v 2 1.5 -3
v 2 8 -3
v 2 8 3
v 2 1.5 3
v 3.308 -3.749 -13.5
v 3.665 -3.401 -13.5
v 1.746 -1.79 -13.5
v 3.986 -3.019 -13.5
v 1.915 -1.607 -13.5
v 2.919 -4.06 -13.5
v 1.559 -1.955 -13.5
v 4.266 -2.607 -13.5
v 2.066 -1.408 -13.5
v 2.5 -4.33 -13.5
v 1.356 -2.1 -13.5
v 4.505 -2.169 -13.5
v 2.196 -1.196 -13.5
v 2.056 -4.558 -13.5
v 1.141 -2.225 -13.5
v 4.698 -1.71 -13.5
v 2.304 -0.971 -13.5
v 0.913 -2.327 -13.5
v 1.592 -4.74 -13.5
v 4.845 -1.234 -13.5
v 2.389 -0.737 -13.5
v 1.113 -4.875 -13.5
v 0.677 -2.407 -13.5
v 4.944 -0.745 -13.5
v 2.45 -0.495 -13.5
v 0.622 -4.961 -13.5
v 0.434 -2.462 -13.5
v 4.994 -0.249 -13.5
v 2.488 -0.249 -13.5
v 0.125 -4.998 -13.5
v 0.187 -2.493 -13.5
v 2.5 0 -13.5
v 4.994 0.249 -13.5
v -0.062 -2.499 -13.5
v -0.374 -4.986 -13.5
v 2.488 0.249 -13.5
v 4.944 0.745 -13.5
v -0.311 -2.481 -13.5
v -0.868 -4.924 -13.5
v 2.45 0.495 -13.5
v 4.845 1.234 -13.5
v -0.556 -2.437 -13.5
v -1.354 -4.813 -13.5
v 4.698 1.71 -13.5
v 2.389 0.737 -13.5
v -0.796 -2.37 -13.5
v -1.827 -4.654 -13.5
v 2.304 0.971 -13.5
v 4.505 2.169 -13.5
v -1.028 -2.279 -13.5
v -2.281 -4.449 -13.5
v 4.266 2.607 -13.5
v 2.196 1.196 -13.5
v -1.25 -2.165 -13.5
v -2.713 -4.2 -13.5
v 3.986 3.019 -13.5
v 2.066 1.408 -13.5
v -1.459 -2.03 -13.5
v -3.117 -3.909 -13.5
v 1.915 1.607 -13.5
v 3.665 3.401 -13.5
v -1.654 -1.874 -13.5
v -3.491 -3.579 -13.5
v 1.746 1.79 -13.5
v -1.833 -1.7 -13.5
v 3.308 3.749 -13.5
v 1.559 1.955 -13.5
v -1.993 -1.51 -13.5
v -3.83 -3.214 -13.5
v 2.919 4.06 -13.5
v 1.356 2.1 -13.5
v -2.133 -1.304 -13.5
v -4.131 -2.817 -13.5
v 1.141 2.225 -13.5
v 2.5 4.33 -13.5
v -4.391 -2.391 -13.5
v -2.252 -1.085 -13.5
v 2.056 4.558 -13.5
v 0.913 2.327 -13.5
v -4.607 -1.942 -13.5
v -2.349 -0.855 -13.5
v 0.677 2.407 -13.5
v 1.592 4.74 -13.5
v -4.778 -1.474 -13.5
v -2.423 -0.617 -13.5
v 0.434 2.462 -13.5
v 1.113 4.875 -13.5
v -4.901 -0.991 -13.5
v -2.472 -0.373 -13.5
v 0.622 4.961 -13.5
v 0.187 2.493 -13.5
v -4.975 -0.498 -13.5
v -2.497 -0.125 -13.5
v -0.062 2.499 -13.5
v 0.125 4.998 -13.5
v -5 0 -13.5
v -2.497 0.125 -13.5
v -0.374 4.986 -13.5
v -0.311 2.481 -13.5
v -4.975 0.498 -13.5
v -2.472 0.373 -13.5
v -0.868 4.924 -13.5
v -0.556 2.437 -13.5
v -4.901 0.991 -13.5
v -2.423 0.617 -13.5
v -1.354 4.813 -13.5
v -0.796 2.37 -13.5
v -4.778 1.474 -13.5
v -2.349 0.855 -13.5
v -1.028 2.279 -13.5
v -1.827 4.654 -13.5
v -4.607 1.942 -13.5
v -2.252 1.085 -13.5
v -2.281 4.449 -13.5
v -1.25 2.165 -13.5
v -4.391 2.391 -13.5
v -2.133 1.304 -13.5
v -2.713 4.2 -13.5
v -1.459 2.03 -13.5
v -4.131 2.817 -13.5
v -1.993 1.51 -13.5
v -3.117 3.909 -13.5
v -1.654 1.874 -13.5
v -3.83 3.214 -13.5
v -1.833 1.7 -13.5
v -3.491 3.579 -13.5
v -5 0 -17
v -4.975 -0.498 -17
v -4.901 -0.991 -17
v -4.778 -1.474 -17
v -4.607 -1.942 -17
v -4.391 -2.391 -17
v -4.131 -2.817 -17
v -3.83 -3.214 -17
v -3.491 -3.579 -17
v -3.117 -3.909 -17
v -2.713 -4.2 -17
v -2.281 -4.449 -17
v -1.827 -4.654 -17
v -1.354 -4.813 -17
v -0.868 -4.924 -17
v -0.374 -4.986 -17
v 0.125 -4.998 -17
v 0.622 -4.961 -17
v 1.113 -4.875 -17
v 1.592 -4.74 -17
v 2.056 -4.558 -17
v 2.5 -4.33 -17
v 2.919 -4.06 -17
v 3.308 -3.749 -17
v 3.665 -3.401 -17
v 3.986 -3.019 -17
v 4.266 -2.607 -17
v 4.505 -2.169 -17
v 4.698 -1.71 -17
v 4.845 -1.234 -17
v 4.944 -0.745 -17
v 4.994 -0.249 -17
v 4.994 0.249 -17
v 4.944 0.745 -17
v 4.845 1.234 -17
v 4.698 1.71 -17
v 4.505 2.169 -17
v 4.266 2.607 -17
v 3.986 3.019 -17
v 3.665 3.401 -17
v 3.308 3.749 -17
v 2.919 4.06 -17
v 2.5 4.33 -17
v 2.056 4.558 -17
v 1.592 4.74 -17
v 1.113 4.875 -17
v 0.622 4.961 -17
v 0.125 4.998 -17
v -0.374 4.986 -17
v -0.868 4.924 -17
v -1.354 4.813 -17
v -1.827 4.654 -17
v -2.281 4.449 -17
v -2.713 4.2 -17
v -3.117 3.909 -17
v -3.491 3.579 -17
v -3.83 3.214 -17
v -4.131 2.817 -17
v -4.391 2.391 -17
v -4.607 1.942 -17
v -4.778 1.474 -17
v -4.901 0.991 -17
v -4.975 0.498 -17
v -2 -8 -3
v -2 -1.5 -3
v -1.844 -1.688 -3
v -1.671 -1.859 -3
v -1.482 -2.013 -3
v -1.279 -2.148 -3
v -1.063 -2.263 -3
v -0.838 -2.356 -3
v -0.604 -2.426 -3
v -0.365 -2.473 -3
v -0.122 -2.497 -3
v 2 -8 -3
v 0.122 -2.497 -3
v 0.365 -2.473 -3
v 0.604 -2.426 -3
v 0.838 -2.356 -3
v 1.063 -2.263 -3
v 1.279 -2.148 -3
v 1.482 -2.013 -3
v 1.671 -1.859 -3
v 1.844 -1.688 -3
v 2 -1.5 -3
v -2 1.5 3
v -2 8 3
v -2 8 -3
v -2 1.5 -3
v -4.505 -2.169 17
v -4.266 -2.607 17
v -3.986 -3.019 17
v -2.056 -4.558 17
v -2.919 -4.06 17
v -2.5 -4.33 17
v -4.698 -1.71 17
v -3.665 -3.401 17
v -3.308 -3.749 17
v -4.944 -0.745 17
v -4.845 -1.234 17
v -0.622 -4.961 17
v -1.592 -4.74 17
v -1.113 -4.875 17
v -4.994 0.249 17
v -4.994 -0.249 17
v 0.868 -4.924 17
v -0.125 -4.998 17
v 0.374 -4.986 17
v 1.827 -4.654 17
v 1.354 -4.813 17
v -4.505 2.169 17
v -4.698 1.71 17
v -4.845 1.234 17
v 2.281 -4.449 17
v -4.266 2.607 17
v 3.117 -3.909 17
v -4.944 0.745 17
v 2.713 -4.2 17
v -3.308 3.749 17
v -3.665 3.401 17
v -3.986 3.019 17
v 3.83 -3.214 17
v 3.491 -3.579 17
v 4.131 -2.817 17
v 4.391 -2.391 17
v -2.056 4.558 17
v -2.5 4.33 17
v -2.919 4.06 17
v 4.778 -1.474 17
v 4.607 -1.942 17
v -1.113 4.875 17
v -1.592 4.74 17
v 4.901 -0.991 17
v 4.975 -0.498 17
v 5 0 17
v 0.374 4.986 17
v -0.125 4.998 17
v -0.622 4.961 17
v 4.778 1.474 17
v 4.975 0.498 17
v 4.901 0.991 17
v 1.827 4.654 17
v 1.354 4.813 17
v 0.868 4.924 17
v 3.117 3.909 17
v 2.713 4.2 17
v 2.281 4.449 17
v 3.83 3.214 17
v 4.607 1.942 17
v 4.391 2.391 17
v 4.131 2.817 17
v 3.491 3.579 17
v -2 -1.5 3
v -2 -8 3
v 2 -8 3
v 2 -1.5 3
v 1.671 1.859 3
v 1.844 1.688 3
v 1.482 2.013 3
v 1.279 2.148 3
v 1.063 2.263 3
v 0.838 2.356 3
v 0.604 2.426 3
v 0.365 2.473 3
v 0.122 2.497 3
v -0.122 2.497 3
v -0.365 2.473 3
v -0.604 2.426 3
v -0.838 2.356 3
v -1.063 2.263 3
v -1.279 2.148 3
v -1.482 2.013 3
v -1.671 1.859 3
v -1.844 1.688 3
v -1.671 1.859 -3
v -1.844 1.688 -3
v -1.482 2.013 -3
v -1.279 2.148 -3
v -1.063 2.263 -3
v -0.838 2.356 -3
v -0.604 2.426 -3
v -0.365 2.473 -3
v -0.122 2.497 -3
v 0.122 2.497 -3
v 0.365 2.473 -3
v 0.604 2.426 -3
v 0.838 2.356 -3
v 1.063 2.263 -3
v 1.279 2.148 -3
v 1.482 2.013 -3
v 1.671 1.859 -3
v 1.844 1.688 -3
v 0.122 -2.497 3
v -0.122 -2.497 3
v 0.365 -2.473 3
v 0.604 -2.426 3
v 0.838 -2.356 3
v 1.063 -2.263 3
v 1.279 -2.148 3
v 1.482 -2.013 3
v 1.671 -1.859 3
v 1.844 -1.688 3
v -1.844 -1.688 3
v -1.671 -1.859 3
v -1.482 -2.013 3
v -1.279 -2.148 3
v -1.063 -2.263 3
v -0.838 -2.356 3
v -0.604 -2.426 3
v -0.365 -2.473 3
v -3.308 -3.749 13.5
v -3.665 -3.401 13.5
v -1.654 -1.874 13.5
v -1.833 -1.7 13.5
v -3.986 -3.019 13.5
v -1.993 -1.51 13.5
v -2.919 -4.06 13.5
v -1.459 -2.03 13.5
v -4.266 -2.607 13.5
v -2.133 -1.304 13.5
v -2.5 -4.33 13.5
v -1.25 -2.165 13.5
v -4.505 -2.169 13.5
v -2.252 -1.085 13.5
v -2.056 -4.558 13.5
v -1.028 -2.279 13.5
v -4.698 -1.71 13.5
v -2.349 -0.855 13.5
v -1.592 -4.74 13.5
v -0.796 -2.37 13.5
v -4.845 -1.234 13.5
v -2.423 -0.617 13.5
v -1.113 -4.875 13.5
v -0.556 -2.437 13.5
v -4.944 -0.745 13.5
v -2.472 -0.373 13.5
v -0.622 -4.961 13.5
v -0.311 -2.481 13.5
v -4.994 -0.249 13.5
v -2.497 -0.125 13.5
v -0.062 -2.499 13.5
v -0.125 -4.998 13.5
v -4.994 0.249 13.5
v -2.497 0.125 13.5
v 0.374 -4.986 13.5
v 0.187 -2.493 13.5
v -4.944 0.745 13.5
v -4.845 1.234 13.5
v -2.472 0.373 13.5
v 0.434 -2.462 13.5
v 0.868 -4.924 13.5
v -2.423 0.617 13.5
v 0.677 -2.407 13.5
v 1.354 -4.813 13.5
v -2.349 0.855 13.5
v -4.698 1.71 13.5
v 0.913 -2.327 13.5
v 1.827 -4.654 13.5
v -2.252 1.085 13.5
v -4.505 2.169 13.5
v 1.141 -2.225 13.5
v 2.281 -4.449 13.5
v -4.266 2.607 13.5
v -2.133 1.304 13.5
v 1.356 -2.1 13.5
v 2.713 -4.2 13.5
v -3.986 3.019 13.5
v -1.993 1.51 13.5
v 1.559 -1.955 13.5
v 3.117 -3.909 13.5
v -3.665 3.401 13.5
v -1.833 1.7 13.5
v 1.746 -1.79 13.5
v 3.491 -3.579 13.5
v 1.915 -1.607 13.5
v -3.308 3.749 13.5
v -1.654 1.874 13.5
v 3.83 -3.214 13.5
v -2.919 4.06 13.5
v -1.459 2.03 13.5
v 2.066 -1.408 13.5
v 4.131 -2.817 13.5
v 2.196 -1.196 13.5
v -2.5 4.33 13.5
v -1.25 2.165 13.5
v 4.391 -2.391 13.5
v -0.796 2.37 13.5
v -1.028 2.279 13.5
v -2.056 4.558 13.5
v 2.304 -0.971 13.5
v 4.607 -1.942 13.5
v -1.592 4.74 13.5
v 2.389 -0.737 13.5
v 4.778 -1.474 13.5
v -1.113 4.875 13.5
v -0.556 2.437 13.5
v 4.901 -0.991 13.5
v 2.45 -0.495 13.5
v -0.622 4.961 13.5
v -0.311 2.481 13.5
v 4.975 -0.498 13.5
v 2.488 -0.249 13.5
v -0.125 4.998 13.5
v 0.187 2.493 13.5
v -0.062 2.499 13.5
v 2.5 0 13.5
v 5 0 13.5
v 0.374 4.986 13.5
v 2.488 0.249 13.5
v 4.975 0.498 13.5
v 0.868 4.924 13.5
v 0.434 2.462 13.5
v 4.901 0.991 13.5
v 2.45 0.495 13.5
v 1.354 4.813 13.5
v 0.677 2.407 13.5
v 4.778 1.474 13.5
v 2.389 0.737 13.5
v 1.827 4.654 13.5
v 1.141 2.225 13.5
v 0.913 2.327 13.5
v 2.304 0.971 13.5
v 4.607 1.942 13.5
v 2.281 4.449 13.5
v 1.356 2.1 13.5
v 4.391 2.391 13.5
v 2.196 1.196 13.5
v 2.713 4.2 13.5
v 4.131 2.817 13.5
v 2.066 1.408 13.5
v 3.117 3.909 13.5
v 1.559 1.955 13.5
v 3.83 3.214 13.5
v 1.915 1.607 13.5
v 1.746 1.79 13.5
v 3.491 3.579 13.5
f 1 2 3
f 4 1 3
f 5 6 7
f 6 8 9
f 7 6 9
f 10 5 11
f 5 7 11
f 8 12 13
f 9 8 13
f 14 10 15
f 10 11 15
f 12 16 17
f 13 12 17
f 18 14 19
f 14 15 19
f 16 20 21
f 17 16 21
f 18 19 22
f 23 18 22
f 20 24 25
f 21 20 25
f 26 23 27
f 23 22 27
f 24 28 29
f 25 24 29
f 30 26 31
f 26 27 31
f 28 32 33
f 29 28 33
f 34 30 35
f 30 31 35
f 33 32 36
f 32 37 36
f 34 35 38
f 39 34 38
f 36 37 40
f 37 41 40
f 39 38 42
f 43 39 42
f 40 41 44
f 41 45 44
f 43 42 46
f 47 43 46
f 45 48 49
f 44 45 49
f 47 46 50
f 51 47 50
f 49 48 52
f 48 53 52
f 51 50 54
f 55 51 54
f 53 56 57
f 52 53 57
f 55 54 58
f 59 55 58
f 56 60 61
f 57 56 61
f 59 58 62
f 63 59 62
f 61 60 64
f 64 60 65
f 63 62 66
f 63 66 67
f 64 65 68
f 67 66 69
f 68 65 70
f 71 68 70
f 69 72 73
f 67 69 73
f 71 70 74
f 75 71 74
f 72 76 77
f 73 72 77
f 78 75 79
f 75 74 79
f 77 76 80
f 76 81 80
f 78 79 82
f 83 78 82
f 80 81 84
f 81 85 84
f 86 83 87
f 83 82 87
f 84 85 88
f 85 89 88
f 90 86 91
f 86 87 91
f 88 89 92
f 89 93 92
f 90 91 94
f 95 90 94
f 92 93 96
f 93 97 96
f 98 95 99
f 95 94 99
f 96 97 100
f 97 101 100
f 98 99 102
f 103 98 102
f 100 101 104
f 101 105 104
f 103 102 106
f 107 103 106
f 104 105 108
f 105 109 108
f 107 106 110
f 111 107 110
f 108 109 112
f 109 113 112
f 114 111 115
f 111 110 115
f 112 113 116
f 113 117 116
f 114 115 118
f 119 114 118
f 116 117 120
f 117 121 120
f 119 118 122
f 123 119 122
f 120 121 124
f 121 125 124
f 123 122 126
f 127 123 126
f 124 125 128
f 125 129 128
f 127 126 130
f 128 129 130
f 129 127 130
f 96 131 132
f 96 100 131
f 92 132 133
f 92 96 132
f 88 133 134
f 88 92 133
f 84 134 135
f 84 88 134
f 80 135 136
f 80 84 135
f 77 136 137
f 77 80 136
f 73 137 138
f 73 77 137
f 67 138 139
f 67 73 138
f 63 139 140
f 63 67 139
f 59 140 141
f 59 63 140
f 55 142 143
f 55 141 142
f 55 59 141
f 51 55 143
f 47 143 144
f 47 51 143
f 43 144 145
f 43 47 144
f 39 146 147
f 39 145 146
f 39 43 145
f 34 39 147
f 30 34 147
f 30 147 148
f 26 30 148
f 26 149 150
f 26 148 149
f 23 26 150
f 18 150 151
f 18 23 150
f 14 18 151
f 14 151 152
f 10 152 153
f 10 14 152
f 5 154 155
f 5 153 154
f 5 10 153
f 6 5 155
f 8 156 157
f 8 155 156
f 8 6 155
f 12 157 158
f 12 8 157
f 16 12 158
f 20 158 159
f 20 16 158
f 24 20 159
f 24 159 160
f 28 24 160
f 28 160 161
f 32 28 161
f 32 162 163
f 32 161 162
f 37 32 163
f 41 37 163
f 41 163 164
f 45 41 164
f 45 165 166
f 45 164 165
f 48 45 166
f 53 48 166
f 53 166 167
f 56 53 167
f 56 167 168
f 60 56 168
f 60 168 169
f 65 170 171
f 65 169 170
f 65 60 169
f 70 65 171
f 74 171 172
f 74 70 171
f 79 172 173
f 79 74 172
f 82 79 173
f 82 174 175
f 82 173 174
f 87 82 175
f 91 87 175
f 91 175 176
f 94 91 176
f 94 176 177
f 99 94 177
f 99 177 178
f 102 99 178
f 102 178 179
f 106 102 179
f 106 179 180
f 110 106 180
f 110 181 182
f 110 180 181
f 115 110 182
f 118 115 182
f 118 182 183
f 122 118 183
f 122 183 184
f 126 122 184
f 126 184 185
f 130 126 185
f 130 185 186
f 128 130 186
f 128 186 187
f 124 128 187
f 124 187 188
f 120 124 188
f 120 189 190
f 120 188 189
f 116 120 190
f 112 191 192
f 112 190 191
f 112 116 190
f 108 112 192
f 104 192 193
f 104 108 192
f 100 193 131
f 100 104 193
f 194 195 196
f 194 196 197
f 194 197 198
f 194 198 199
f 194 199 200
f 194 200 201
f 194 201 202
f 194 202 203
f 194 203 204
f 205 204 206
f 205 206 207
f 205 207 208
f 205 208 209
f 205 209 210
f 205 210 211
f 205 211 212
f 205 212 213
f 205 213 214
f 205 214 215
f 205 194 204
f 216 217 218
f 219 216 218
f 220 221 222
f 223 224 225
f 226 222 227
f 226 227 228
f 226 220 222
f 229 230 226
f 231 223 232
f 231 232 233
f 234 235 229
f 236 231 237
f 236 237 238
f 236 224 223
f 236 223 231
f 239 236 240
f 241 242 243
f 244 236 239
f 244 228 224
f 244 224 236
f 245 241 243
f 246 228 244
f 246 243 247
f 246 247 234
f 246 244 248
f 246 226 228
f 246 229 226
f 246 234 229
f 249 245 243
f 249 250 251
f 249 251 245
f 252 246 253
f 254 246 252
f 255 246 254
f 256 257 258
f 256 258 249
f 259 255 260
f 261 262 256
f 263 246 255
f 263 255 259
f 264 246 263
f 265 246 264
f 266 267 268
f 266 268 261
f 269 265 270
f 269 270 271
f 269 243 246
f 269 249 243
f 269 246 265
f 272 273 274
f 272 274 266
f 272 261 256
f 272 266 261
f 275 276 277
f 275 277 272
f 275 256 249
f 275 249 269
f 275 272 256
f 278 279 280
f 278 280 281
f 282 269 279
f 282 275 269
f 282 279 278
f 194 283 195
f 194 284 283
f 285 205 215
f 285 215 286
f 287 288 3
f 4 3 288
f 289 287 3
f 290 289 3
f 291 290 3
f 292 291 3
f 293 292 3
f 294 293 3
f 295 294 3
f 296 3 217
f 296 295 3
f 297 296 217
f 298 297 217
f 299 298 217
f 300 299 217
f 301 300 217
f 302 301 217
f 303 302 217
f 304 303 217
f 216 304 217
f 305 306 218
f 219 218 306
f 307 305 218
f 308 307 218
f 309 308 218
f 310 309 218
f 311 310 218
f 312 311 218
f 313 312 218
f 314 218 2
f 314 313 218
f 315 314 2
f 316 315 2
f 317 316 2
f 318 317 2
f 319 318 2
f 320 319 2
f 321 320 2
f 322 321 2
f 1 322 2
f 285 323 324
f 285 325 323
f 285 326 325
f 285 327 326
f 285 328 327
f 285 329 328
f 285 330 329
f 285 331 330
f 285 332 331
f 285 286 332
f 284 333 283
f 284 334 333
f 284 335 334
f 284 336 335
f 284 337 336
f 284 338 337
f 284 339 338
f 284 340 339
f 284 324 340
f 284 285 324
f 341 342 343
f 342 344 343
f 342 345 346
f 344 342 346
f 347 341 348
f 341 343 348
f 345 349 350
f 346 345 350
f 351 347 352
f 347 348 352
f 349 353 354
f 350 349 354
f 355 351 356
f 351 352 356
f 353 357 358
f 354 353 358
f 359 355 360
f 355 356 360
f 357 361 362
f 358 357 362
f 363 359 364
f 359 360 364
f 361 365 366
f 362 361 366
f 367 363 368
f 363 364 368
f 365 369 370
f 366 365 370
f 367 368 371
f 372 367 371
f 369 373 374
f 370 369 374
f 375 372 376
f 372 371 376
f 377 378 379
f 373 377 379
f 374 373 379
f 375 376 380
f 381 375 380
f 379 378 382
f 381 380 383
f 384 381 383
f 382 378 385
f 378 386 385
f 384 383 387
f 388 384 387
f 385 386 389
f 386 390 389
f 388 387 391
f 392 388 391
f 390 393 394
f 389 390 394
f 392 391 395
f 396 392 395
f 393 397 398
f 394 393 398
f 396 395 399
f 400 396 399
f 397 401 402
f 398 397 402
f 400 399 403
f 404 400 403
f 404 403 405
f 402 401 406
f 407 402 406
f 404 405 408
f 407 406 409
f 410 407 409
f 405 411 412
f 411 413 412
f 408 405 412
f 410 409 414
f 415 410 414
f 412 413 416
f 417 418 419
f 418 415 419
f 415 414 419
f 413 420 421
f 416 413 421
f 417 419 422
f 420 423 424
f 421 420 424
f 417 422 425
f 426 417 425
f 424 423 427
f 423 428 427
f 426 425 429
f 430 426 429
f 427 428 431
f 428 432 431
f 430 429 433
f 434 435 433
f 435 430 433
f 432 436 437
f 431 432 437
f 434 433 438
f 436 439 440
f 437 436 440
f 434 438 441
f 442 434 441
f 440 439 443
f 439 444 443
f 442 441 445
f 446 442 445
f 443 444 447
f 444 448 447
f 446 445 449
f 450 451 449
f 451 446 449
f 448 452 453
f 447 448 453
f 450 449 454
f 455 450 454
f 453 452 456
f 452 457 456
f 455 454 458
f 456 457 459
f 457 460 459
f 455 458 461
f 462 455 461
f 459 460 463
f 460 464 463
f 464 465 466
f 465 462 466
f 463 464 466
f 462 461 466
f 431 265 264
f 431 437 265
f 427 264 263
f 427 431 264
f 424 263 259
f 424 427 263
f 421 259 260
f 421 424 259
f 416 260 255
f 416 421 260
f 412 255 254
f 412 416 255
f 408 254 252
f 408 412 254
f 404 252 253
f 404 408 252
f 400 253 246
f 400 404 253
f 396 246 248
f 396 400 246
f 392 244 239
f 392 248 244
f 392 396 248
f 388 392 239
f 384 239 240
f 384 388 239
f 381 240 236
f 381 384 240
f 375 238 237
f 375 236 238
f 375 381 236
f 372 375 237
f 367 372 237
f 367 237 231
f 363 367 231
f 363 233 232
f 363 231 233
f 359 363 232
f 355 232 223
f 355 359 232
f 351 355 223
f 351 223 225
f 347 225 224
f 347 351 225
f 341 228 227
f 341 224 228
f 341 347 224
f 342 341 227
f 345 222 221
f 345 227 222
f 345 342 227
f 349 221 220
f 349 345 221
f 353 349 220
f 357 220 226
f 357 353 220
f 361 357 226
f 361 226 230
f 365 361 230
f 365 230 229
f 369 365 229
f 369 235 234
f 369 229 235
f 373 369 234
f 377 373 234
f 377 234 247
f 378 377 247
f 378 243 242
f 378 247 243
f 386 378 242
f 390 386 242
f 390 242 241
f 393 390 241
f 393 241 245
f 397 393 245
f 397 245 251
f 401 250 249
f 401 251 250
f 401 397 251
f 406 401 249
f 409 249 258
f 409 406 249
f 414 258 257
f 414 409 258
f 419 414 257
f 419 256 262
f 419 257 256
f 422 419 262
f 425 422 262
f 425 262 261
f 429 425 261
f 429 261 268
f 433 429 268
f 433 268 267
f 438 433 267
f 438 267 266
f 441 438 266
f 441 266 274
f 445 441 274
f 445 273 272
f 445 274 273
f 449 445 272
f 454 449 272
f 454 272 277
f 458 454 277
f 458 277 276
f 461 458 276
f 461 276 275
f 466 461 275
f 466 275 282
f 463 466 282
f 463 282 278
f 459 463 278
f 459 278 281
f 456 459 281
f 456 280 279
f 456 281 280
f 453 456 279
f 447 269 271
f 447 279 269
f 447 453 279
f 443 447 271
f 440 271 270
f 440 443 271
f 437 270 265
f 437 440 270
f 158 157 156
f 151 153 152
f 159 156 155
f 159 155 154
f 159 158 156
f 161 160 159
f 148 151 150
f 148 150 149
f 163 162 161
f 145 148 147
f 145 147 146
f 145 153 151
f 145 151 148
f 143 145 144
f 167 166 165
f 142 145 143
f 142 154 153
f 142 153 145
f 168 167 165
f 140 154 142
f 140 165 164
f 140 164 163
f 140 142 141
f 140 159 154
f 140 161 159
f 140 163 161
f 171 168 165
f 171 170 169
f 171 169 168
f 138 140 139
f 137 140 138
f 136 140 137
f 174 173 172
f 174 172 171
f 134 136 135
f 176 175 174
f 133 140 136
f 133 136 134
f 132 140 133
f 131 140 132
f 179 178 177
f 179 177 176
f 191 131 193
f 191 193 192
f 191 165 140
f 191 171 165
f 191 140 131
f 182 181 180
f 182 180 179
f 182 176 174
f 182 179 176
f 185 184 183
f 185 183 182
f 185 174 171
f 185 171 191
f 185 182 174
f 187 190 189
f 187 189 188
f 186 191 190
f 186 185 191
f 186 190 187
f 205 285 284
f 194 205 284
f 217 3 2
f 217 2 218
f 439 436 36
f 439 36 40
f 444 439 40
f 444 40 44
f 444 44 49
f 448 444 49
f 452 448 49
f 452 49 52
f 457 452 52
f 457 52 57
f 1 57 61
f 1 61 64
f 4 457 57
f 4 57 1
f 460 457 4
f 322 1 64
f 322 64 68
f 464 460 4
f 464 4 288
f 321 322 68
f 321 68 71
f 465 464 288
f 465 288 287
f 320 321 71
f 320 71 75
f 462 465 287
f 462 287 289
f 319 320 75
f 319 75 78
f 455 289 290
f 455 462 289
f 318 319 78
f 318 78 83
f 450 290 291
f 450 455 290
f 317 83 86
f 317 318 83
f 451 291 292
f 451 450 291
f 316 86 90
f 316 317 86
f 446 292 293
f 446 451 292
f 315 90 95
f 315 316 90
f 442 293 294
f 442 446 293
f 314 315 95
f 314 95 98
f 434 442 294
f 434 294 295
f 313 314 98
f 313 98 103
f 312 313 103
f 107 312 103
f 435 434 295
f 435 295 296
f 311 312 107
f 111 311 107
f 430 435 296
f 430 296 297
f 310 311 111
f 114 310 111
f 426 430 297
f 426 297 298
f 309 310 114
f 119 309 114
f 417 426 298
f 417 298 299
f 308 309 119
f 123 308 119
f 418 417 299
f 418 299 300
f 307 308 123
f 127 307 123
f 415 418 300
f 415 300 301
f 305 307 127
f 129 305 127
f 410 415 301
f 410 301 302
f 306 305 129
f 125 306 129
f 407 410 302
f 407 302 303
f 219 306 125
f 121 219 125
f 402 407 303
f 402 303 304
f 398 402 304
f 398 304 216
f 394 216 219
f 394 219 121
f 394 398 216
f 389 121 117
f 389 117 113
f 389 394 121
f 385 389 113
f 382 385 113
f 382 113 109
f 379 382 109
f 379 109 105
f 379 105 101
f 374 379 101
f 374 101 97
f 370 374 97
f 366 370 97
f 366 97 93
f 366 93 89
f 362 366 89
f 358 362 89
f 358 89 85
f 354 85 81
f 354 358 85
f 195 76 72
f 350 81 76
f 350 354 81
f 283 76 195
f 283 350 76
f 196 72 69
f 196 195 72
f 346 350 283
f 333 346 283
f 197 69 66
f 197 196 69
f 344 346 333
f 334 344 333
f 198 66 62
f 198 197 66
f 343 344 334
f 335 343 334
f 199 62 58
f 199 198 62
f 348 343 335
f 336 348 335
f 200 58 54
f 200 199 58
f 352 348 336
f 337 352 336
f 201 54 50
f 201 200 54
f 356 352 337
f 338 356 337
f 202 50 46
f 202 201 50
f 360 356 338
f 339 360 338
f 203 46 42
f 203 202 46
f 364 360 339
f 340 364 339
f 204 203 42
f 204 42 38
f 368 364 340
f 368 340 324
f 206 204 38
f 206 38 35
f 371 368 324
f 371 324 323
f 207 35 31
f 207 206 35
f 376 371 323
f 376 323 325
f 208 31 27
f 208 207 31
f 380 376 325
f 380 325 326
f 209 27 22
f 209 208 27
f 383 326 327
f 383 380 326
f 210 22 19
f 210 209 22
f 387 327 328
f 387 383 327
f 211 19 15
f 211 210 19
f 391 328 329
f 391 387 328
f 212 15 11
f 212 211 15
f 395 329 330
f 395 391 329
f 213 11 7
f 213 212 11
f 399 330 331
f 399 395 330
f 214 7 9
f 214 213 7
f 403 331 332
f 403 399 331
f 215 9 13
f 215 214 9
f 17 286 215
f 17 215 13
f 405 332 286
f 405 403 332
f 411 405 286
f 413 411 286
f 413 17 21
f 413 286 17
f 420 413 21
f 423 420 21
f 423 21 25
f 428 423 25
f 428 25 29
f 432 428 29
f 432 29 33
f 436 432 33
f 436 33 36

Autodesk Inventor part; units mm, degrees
ref_plane "YZ Plane" through (0, 0, 0) normal (1, 0, 0) x (0, 1, 0)
ref_plane "XZ Plane" through (0, 0, 0) normal (0, 1, 0) x (-1, 0, 0)
ref_plane "XY Plane" through (0, 0, 0) normal (0, 0, 1) x (1, 0, 0)
sketch "스케치1" plane through (0, 0, 0) normal (0, 0, 1) x (1, 0, 0)
  circle A0 centre (0, 0) radius 2.5
  dimension "d0" = 5
extrude "돌출1" add sketch "스케치1" along normal mid plane 27
sketch "스케치2" plane through (0, 0, 13.5) normal (0, 0, 1) x (1, 0, 0)
  circle A0 centre (0, 0) radius 5
  dimension "d3" = 10
extrude "돌출2" add sketch "스케치2" along normal blind 3.5
sketch "스케치3" plane through (0, 0, -13.5) normal (0, 0, -1) x (-1, 0, 0)
  circle A0 centre (0, 0) radius 5
  dimension "d6" = 10
extrude "돌출3" add sketch "스케치3" along normal blind 3.5
sketch "스케치4" plane through (0, 0, 0) normal (0, 1, 0) x (-1, 0, 0)
  line L0 (-2, 3) -> (2, 3)
  line L1 (2, 3) -> (2, -3)
  line L2 (2, -3) -> (-2, -3)
  line L3 (-2, -3) -> (-2, 3)
  line L4 (-2, 3) -> (2, -3) construction
  line L5 (2, 3) -> (-2, -3) construction
  point P0 (0, 0)
  dimension "d9" = 4
  dimension "d10" = 6
extrude "돌출4" add sketch "스케치4" along normal mid plane 16
properties part number "15-2"
